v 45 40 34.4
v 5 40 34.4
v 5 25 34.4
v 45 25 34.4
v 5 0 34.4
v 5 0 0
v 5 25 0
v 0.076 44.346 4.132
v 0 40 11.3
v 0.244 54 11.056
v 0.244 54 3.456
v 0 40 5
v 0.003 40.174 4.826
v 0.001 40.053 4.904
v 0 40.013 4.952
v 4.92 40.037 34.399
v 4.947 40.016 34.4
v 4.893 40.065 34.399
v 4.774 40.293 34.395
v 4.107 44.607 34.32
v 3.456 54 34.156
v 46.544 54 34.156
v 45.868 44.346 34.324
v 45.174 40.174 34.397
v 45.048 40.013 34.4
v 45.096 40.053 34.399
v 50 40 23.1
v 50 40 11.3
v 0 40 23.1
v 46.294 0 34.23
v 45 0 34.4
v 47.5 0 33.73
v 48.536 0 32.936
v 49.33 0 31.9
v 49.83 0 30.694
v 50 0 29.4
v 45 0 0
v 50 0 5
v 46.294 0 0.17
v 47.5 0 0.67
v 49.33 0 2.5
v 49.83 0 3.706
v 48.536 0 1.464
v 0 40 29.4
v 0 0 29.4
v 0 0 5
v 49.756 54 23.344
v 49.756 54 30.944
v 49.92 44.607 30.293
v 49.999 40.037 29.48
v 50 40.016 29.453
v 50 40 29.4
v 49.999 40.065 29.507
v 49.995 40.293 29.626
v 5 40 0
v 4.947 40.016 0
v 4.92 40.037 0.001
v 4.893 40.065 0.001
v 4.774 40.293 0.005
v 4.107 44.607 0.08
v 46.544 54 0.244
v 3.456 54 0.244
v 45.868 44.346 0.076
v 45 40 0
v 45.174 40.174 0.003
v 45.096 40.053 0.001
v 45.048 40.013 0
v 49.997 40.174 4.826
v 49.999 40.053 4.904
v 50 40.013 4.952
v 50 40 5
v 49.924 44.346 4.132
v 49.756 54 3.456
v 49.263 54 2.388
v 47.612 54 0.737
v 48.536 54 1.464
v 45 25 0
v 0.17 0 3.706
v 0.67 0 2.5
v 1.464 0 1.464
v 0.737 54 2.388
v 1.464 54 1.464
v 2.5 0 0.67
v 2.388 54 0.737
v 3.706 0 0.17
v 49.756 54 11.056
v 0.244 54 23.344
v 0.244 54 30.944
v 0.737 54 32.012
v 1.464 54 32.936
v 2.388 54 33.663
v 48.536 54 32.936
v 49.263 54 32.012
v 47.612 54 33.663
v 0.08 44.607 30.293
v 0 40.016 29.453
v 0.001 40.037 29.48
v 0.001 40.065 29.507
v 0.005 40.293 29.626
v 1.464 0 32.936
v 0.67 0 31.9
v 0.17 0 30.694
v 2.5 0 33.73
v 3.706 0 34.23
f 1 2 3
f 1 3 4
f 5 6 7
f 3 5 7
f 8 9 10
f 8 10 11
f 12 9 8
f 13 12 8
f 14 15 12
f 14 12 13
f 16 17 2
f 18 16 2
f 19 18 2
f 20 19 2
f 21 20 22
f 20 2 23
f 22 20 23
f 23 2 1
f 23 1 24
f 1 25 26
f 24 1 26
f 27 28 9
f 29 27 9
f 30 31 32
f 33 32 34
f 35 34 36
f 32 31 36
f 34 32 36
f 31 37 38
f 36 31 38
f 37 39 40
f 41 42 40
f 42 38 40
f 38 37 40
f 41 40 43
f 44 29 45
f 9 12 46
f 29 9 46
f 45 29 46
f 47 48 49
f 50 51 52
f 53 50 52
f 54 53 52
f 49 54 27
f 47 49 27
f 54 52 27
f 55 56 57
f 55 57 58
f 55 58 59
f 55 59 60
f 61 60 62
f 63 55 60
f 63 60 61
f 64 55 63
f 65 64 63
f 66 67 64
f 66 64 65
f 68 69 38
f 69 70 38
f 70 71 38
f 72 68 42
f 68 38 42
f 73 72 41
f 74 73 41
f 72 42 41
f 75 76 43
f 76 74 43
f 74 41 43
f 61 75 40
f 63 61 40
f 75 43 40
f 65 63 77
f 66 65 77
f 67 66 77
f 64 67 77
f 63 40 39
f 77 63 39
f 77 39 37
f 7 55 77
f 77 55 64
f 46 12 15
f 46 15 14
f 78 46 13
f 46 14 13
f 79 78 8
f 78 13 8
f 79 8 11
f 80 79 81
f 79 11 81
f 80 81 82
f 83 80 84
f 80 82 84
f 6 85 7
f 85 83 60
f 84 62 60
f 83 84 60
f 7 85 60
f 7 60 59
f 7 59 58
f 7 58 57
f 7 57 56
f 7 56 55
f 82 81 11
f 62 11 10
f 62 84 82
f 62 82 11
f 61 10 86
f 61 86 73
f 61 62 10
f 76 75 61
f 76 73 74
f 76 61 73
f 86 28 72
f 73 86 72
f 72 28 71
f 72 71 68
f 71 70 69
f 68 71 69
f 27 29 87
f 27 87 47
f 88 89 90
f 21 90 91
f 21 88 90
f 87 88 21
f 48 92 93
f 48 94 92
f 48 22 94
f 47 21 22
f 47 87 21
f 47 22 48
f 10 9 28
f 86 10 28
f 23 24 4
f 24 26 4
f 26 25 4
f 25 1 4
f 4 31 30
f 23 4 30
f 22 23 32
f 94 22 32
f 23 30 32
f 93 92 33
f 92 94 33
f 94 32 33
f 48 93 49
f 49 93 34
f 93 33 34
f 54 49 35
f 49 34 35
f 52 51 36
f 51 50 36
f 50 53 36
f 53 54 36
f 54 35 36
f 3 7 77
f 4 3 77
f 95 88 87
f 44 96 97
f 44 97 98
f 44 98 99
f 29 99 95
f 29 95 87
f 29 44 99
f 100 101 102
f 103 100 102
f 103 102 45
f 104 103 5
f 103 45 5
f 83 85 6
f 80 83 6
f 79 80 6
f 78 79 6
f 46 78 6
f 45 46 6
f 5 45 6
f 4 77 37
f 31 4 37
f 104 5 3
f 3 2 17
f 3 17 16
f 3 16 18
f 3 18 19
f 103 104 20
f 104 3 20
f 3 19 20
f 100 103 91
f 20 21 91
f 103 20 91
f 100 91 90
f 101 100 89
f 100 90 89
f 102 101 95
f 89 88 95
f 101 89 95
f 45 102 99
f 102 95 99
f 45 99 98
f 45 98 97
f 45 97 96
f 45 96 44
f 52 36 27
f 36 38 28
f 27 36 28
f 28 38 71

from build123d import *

# Parameters (mm, degrees)
BOSS_EXTRUDE1_DEPTH           = 34.4
SKETCH2_W                     = 50
SKETCH2_H                     = 11.3
BOSS_EXTRUDE2_DEPTH           = 14
BOSS_EXTRUDE2_DRAFT           = 1
BOSS_EXTRUDE2_PROFILE_2_DEPTH = 14
BOSS_EXTRUDE2_PROFILE_2_DRAFT = 1
FILLET1_R                     = 5


with BuildPart() as part:
    # Sketch1 → Boss-Extrude1 (new body)
    with BuildSketch(Plane.XY):
        Polygon((45, 0), (50, 0), (50, 40), (0, 40), (0, 0), (5, 0), (5, 25), (45, 25), align=None)
    extrude(amount=BOSS_EXTRUDE1_DEPTH)


with BuildPart() as boss_extrude2_tool:
    # Sketch2 → Boss-Extrude2 (with draft: the straight prism first)
    with BuildSketch(Plane(origin=(0, 40, 0), x_dir=(1, 0, 0), z_dir=(0, 1, 0))):
        with Locations((25, -5.65)):
            Rectangle(SKETCH2_W, SKETCH2_H)
    extrude(amount=BOSS_EXTRUDE2_DEPTH)
    # Boss-Extrude2: the draft: its side faces are tilted about the plane it starts from
    boss_extrude2_sides = [boss_extrude2_tool.faces().sort_by_distance(p)[0] for p in [
        (0, 47, 5.65),
        (25, 47, 11.3),
        (50, 47, 5.65),
        (25, 47, 0),
    ]]
    draft(boss_extrude2_sides, Plane(origin=(0, 40, 0), x_dir=(1, 0, 0), z_dir=(0, 1, 0)), BOSS_EXTRUDE2_DRAFT)


with BuildPart() as part_1:
    add(part.part)

    # Boss-Extrude2: add boss_extrude2_tool
    add(boss_extrude2_tool.part)


with BuildPart() as boss_extrude2_profile_2_tool:
    # Sketch2 → Boss-Extrude2 profile 2 (with draft: the straight prism first)
    with BuildSketch(Plane(origin=(0, 40, 0), x_dir=(1, 0, 0), z_dir=(0, 1, 0))):
        with Locations((25, -28.75)):
            Rectangle(SKETCH2_W, SKETCH2_H)
    extrude(amount=BOSS_EXTRUDE2_PROFILE_2_DEPTH)
    # Boss-Extrude2 profile 2: the draft: its side faces are tilted about the plane it starts from
    boss_extrude2_profile_2_sides = [boss_extrude2_profile_2_tool.faces().sort_by_distance(p)[0] for p in [
        (25, 47, 34.4),
        (50, 47, 28.75),
        (25, 47, 23.1),
        (0, 47, 28.75),
    ]]
    draft(boss_extrude2_profile_2_sides, Plane(origin=(0, 40, 0), x_dir=(1, 0, 0), z_dir=(0, 1, 0)), BOSS_EXTRUDE2_PROFILE_2_DRAFT)


with BuildPart() as part_2:
    add(part_1.part)

    # Boss-Extrude2 profile 2: add boss_extrude2_profile_2_tool
    add(boss_extrude2_profile_2_tool.part)

    # Fillet1
    # the kernel refuses this fillet: 5 mm, written as the material it takes off along each edge
    with BuildSketch(Plane(origin=(50, -30, 34.4), x_dir=(-1, 0, 0), z_dir=(0, 1, 0)), Plane(origin=(0, 70, 0), x_dir=(0, 0, 1), z_dir=(0, -1, 0))) as fillet1_piece_1:
        with BuildLine():
            CenterArc((FILLET1_R, -FILLET1_R), FILLET1_R, 90, 90)
            Line((0, -FILLET1_R), (-FILLET1_R * 0.02, -FILLET1_R))
            Line((-FILLET1_R * 0.02, -FILLET1_R), (-FILLET1_R * 0.02, FILLET1_R * 0.02))
            Line((-FILLET1_R * 0.02, FILLET1_R * 0.02), (FILLET1_R, FILLET1_R * 0.02))
            Line((FILLET1_R, FILLET1_R * 0.02), (FILLET1_R, 0))
        make_face()
    extrude(amount=100, mode=Mode.SUBTRACT)
    with BuildSketch(Plane(origin=(50, -30, 0), x_dir=(-1, 0, 0), z_dir=(0, 1, 0)), Plane(origin=(0, 70, 34.4), x_dir=(0, 0, -1), z_dir=(0, -1, 0))) as fillet1_piece_2:
        with BuildLine():
            CenterArc((FILLET1_R, FILLET1_R), FILLET1_R, 180, 90)
            Line((0, FILLET1_R), (-FILLET1_R * 0.02, FILLET1_R))
            Line((-FILLET1_R * 0.02, FILLET1_R), (-FILLET1_R * 0.02, -FILLET1_R * 0.02))
            Line((-FILLET1_R * 0.02, -FILLET1_R * 0.02), (FILLET1_R, -FILLET1_R * 0.02))
            Line((FILLET1_R, -FILLET1_R * 0.02), (FILLET1_R, 0))
        make_face()
    extrude(amount=100, mode=Mode.SUBTRACT)


solid = part_2.part
